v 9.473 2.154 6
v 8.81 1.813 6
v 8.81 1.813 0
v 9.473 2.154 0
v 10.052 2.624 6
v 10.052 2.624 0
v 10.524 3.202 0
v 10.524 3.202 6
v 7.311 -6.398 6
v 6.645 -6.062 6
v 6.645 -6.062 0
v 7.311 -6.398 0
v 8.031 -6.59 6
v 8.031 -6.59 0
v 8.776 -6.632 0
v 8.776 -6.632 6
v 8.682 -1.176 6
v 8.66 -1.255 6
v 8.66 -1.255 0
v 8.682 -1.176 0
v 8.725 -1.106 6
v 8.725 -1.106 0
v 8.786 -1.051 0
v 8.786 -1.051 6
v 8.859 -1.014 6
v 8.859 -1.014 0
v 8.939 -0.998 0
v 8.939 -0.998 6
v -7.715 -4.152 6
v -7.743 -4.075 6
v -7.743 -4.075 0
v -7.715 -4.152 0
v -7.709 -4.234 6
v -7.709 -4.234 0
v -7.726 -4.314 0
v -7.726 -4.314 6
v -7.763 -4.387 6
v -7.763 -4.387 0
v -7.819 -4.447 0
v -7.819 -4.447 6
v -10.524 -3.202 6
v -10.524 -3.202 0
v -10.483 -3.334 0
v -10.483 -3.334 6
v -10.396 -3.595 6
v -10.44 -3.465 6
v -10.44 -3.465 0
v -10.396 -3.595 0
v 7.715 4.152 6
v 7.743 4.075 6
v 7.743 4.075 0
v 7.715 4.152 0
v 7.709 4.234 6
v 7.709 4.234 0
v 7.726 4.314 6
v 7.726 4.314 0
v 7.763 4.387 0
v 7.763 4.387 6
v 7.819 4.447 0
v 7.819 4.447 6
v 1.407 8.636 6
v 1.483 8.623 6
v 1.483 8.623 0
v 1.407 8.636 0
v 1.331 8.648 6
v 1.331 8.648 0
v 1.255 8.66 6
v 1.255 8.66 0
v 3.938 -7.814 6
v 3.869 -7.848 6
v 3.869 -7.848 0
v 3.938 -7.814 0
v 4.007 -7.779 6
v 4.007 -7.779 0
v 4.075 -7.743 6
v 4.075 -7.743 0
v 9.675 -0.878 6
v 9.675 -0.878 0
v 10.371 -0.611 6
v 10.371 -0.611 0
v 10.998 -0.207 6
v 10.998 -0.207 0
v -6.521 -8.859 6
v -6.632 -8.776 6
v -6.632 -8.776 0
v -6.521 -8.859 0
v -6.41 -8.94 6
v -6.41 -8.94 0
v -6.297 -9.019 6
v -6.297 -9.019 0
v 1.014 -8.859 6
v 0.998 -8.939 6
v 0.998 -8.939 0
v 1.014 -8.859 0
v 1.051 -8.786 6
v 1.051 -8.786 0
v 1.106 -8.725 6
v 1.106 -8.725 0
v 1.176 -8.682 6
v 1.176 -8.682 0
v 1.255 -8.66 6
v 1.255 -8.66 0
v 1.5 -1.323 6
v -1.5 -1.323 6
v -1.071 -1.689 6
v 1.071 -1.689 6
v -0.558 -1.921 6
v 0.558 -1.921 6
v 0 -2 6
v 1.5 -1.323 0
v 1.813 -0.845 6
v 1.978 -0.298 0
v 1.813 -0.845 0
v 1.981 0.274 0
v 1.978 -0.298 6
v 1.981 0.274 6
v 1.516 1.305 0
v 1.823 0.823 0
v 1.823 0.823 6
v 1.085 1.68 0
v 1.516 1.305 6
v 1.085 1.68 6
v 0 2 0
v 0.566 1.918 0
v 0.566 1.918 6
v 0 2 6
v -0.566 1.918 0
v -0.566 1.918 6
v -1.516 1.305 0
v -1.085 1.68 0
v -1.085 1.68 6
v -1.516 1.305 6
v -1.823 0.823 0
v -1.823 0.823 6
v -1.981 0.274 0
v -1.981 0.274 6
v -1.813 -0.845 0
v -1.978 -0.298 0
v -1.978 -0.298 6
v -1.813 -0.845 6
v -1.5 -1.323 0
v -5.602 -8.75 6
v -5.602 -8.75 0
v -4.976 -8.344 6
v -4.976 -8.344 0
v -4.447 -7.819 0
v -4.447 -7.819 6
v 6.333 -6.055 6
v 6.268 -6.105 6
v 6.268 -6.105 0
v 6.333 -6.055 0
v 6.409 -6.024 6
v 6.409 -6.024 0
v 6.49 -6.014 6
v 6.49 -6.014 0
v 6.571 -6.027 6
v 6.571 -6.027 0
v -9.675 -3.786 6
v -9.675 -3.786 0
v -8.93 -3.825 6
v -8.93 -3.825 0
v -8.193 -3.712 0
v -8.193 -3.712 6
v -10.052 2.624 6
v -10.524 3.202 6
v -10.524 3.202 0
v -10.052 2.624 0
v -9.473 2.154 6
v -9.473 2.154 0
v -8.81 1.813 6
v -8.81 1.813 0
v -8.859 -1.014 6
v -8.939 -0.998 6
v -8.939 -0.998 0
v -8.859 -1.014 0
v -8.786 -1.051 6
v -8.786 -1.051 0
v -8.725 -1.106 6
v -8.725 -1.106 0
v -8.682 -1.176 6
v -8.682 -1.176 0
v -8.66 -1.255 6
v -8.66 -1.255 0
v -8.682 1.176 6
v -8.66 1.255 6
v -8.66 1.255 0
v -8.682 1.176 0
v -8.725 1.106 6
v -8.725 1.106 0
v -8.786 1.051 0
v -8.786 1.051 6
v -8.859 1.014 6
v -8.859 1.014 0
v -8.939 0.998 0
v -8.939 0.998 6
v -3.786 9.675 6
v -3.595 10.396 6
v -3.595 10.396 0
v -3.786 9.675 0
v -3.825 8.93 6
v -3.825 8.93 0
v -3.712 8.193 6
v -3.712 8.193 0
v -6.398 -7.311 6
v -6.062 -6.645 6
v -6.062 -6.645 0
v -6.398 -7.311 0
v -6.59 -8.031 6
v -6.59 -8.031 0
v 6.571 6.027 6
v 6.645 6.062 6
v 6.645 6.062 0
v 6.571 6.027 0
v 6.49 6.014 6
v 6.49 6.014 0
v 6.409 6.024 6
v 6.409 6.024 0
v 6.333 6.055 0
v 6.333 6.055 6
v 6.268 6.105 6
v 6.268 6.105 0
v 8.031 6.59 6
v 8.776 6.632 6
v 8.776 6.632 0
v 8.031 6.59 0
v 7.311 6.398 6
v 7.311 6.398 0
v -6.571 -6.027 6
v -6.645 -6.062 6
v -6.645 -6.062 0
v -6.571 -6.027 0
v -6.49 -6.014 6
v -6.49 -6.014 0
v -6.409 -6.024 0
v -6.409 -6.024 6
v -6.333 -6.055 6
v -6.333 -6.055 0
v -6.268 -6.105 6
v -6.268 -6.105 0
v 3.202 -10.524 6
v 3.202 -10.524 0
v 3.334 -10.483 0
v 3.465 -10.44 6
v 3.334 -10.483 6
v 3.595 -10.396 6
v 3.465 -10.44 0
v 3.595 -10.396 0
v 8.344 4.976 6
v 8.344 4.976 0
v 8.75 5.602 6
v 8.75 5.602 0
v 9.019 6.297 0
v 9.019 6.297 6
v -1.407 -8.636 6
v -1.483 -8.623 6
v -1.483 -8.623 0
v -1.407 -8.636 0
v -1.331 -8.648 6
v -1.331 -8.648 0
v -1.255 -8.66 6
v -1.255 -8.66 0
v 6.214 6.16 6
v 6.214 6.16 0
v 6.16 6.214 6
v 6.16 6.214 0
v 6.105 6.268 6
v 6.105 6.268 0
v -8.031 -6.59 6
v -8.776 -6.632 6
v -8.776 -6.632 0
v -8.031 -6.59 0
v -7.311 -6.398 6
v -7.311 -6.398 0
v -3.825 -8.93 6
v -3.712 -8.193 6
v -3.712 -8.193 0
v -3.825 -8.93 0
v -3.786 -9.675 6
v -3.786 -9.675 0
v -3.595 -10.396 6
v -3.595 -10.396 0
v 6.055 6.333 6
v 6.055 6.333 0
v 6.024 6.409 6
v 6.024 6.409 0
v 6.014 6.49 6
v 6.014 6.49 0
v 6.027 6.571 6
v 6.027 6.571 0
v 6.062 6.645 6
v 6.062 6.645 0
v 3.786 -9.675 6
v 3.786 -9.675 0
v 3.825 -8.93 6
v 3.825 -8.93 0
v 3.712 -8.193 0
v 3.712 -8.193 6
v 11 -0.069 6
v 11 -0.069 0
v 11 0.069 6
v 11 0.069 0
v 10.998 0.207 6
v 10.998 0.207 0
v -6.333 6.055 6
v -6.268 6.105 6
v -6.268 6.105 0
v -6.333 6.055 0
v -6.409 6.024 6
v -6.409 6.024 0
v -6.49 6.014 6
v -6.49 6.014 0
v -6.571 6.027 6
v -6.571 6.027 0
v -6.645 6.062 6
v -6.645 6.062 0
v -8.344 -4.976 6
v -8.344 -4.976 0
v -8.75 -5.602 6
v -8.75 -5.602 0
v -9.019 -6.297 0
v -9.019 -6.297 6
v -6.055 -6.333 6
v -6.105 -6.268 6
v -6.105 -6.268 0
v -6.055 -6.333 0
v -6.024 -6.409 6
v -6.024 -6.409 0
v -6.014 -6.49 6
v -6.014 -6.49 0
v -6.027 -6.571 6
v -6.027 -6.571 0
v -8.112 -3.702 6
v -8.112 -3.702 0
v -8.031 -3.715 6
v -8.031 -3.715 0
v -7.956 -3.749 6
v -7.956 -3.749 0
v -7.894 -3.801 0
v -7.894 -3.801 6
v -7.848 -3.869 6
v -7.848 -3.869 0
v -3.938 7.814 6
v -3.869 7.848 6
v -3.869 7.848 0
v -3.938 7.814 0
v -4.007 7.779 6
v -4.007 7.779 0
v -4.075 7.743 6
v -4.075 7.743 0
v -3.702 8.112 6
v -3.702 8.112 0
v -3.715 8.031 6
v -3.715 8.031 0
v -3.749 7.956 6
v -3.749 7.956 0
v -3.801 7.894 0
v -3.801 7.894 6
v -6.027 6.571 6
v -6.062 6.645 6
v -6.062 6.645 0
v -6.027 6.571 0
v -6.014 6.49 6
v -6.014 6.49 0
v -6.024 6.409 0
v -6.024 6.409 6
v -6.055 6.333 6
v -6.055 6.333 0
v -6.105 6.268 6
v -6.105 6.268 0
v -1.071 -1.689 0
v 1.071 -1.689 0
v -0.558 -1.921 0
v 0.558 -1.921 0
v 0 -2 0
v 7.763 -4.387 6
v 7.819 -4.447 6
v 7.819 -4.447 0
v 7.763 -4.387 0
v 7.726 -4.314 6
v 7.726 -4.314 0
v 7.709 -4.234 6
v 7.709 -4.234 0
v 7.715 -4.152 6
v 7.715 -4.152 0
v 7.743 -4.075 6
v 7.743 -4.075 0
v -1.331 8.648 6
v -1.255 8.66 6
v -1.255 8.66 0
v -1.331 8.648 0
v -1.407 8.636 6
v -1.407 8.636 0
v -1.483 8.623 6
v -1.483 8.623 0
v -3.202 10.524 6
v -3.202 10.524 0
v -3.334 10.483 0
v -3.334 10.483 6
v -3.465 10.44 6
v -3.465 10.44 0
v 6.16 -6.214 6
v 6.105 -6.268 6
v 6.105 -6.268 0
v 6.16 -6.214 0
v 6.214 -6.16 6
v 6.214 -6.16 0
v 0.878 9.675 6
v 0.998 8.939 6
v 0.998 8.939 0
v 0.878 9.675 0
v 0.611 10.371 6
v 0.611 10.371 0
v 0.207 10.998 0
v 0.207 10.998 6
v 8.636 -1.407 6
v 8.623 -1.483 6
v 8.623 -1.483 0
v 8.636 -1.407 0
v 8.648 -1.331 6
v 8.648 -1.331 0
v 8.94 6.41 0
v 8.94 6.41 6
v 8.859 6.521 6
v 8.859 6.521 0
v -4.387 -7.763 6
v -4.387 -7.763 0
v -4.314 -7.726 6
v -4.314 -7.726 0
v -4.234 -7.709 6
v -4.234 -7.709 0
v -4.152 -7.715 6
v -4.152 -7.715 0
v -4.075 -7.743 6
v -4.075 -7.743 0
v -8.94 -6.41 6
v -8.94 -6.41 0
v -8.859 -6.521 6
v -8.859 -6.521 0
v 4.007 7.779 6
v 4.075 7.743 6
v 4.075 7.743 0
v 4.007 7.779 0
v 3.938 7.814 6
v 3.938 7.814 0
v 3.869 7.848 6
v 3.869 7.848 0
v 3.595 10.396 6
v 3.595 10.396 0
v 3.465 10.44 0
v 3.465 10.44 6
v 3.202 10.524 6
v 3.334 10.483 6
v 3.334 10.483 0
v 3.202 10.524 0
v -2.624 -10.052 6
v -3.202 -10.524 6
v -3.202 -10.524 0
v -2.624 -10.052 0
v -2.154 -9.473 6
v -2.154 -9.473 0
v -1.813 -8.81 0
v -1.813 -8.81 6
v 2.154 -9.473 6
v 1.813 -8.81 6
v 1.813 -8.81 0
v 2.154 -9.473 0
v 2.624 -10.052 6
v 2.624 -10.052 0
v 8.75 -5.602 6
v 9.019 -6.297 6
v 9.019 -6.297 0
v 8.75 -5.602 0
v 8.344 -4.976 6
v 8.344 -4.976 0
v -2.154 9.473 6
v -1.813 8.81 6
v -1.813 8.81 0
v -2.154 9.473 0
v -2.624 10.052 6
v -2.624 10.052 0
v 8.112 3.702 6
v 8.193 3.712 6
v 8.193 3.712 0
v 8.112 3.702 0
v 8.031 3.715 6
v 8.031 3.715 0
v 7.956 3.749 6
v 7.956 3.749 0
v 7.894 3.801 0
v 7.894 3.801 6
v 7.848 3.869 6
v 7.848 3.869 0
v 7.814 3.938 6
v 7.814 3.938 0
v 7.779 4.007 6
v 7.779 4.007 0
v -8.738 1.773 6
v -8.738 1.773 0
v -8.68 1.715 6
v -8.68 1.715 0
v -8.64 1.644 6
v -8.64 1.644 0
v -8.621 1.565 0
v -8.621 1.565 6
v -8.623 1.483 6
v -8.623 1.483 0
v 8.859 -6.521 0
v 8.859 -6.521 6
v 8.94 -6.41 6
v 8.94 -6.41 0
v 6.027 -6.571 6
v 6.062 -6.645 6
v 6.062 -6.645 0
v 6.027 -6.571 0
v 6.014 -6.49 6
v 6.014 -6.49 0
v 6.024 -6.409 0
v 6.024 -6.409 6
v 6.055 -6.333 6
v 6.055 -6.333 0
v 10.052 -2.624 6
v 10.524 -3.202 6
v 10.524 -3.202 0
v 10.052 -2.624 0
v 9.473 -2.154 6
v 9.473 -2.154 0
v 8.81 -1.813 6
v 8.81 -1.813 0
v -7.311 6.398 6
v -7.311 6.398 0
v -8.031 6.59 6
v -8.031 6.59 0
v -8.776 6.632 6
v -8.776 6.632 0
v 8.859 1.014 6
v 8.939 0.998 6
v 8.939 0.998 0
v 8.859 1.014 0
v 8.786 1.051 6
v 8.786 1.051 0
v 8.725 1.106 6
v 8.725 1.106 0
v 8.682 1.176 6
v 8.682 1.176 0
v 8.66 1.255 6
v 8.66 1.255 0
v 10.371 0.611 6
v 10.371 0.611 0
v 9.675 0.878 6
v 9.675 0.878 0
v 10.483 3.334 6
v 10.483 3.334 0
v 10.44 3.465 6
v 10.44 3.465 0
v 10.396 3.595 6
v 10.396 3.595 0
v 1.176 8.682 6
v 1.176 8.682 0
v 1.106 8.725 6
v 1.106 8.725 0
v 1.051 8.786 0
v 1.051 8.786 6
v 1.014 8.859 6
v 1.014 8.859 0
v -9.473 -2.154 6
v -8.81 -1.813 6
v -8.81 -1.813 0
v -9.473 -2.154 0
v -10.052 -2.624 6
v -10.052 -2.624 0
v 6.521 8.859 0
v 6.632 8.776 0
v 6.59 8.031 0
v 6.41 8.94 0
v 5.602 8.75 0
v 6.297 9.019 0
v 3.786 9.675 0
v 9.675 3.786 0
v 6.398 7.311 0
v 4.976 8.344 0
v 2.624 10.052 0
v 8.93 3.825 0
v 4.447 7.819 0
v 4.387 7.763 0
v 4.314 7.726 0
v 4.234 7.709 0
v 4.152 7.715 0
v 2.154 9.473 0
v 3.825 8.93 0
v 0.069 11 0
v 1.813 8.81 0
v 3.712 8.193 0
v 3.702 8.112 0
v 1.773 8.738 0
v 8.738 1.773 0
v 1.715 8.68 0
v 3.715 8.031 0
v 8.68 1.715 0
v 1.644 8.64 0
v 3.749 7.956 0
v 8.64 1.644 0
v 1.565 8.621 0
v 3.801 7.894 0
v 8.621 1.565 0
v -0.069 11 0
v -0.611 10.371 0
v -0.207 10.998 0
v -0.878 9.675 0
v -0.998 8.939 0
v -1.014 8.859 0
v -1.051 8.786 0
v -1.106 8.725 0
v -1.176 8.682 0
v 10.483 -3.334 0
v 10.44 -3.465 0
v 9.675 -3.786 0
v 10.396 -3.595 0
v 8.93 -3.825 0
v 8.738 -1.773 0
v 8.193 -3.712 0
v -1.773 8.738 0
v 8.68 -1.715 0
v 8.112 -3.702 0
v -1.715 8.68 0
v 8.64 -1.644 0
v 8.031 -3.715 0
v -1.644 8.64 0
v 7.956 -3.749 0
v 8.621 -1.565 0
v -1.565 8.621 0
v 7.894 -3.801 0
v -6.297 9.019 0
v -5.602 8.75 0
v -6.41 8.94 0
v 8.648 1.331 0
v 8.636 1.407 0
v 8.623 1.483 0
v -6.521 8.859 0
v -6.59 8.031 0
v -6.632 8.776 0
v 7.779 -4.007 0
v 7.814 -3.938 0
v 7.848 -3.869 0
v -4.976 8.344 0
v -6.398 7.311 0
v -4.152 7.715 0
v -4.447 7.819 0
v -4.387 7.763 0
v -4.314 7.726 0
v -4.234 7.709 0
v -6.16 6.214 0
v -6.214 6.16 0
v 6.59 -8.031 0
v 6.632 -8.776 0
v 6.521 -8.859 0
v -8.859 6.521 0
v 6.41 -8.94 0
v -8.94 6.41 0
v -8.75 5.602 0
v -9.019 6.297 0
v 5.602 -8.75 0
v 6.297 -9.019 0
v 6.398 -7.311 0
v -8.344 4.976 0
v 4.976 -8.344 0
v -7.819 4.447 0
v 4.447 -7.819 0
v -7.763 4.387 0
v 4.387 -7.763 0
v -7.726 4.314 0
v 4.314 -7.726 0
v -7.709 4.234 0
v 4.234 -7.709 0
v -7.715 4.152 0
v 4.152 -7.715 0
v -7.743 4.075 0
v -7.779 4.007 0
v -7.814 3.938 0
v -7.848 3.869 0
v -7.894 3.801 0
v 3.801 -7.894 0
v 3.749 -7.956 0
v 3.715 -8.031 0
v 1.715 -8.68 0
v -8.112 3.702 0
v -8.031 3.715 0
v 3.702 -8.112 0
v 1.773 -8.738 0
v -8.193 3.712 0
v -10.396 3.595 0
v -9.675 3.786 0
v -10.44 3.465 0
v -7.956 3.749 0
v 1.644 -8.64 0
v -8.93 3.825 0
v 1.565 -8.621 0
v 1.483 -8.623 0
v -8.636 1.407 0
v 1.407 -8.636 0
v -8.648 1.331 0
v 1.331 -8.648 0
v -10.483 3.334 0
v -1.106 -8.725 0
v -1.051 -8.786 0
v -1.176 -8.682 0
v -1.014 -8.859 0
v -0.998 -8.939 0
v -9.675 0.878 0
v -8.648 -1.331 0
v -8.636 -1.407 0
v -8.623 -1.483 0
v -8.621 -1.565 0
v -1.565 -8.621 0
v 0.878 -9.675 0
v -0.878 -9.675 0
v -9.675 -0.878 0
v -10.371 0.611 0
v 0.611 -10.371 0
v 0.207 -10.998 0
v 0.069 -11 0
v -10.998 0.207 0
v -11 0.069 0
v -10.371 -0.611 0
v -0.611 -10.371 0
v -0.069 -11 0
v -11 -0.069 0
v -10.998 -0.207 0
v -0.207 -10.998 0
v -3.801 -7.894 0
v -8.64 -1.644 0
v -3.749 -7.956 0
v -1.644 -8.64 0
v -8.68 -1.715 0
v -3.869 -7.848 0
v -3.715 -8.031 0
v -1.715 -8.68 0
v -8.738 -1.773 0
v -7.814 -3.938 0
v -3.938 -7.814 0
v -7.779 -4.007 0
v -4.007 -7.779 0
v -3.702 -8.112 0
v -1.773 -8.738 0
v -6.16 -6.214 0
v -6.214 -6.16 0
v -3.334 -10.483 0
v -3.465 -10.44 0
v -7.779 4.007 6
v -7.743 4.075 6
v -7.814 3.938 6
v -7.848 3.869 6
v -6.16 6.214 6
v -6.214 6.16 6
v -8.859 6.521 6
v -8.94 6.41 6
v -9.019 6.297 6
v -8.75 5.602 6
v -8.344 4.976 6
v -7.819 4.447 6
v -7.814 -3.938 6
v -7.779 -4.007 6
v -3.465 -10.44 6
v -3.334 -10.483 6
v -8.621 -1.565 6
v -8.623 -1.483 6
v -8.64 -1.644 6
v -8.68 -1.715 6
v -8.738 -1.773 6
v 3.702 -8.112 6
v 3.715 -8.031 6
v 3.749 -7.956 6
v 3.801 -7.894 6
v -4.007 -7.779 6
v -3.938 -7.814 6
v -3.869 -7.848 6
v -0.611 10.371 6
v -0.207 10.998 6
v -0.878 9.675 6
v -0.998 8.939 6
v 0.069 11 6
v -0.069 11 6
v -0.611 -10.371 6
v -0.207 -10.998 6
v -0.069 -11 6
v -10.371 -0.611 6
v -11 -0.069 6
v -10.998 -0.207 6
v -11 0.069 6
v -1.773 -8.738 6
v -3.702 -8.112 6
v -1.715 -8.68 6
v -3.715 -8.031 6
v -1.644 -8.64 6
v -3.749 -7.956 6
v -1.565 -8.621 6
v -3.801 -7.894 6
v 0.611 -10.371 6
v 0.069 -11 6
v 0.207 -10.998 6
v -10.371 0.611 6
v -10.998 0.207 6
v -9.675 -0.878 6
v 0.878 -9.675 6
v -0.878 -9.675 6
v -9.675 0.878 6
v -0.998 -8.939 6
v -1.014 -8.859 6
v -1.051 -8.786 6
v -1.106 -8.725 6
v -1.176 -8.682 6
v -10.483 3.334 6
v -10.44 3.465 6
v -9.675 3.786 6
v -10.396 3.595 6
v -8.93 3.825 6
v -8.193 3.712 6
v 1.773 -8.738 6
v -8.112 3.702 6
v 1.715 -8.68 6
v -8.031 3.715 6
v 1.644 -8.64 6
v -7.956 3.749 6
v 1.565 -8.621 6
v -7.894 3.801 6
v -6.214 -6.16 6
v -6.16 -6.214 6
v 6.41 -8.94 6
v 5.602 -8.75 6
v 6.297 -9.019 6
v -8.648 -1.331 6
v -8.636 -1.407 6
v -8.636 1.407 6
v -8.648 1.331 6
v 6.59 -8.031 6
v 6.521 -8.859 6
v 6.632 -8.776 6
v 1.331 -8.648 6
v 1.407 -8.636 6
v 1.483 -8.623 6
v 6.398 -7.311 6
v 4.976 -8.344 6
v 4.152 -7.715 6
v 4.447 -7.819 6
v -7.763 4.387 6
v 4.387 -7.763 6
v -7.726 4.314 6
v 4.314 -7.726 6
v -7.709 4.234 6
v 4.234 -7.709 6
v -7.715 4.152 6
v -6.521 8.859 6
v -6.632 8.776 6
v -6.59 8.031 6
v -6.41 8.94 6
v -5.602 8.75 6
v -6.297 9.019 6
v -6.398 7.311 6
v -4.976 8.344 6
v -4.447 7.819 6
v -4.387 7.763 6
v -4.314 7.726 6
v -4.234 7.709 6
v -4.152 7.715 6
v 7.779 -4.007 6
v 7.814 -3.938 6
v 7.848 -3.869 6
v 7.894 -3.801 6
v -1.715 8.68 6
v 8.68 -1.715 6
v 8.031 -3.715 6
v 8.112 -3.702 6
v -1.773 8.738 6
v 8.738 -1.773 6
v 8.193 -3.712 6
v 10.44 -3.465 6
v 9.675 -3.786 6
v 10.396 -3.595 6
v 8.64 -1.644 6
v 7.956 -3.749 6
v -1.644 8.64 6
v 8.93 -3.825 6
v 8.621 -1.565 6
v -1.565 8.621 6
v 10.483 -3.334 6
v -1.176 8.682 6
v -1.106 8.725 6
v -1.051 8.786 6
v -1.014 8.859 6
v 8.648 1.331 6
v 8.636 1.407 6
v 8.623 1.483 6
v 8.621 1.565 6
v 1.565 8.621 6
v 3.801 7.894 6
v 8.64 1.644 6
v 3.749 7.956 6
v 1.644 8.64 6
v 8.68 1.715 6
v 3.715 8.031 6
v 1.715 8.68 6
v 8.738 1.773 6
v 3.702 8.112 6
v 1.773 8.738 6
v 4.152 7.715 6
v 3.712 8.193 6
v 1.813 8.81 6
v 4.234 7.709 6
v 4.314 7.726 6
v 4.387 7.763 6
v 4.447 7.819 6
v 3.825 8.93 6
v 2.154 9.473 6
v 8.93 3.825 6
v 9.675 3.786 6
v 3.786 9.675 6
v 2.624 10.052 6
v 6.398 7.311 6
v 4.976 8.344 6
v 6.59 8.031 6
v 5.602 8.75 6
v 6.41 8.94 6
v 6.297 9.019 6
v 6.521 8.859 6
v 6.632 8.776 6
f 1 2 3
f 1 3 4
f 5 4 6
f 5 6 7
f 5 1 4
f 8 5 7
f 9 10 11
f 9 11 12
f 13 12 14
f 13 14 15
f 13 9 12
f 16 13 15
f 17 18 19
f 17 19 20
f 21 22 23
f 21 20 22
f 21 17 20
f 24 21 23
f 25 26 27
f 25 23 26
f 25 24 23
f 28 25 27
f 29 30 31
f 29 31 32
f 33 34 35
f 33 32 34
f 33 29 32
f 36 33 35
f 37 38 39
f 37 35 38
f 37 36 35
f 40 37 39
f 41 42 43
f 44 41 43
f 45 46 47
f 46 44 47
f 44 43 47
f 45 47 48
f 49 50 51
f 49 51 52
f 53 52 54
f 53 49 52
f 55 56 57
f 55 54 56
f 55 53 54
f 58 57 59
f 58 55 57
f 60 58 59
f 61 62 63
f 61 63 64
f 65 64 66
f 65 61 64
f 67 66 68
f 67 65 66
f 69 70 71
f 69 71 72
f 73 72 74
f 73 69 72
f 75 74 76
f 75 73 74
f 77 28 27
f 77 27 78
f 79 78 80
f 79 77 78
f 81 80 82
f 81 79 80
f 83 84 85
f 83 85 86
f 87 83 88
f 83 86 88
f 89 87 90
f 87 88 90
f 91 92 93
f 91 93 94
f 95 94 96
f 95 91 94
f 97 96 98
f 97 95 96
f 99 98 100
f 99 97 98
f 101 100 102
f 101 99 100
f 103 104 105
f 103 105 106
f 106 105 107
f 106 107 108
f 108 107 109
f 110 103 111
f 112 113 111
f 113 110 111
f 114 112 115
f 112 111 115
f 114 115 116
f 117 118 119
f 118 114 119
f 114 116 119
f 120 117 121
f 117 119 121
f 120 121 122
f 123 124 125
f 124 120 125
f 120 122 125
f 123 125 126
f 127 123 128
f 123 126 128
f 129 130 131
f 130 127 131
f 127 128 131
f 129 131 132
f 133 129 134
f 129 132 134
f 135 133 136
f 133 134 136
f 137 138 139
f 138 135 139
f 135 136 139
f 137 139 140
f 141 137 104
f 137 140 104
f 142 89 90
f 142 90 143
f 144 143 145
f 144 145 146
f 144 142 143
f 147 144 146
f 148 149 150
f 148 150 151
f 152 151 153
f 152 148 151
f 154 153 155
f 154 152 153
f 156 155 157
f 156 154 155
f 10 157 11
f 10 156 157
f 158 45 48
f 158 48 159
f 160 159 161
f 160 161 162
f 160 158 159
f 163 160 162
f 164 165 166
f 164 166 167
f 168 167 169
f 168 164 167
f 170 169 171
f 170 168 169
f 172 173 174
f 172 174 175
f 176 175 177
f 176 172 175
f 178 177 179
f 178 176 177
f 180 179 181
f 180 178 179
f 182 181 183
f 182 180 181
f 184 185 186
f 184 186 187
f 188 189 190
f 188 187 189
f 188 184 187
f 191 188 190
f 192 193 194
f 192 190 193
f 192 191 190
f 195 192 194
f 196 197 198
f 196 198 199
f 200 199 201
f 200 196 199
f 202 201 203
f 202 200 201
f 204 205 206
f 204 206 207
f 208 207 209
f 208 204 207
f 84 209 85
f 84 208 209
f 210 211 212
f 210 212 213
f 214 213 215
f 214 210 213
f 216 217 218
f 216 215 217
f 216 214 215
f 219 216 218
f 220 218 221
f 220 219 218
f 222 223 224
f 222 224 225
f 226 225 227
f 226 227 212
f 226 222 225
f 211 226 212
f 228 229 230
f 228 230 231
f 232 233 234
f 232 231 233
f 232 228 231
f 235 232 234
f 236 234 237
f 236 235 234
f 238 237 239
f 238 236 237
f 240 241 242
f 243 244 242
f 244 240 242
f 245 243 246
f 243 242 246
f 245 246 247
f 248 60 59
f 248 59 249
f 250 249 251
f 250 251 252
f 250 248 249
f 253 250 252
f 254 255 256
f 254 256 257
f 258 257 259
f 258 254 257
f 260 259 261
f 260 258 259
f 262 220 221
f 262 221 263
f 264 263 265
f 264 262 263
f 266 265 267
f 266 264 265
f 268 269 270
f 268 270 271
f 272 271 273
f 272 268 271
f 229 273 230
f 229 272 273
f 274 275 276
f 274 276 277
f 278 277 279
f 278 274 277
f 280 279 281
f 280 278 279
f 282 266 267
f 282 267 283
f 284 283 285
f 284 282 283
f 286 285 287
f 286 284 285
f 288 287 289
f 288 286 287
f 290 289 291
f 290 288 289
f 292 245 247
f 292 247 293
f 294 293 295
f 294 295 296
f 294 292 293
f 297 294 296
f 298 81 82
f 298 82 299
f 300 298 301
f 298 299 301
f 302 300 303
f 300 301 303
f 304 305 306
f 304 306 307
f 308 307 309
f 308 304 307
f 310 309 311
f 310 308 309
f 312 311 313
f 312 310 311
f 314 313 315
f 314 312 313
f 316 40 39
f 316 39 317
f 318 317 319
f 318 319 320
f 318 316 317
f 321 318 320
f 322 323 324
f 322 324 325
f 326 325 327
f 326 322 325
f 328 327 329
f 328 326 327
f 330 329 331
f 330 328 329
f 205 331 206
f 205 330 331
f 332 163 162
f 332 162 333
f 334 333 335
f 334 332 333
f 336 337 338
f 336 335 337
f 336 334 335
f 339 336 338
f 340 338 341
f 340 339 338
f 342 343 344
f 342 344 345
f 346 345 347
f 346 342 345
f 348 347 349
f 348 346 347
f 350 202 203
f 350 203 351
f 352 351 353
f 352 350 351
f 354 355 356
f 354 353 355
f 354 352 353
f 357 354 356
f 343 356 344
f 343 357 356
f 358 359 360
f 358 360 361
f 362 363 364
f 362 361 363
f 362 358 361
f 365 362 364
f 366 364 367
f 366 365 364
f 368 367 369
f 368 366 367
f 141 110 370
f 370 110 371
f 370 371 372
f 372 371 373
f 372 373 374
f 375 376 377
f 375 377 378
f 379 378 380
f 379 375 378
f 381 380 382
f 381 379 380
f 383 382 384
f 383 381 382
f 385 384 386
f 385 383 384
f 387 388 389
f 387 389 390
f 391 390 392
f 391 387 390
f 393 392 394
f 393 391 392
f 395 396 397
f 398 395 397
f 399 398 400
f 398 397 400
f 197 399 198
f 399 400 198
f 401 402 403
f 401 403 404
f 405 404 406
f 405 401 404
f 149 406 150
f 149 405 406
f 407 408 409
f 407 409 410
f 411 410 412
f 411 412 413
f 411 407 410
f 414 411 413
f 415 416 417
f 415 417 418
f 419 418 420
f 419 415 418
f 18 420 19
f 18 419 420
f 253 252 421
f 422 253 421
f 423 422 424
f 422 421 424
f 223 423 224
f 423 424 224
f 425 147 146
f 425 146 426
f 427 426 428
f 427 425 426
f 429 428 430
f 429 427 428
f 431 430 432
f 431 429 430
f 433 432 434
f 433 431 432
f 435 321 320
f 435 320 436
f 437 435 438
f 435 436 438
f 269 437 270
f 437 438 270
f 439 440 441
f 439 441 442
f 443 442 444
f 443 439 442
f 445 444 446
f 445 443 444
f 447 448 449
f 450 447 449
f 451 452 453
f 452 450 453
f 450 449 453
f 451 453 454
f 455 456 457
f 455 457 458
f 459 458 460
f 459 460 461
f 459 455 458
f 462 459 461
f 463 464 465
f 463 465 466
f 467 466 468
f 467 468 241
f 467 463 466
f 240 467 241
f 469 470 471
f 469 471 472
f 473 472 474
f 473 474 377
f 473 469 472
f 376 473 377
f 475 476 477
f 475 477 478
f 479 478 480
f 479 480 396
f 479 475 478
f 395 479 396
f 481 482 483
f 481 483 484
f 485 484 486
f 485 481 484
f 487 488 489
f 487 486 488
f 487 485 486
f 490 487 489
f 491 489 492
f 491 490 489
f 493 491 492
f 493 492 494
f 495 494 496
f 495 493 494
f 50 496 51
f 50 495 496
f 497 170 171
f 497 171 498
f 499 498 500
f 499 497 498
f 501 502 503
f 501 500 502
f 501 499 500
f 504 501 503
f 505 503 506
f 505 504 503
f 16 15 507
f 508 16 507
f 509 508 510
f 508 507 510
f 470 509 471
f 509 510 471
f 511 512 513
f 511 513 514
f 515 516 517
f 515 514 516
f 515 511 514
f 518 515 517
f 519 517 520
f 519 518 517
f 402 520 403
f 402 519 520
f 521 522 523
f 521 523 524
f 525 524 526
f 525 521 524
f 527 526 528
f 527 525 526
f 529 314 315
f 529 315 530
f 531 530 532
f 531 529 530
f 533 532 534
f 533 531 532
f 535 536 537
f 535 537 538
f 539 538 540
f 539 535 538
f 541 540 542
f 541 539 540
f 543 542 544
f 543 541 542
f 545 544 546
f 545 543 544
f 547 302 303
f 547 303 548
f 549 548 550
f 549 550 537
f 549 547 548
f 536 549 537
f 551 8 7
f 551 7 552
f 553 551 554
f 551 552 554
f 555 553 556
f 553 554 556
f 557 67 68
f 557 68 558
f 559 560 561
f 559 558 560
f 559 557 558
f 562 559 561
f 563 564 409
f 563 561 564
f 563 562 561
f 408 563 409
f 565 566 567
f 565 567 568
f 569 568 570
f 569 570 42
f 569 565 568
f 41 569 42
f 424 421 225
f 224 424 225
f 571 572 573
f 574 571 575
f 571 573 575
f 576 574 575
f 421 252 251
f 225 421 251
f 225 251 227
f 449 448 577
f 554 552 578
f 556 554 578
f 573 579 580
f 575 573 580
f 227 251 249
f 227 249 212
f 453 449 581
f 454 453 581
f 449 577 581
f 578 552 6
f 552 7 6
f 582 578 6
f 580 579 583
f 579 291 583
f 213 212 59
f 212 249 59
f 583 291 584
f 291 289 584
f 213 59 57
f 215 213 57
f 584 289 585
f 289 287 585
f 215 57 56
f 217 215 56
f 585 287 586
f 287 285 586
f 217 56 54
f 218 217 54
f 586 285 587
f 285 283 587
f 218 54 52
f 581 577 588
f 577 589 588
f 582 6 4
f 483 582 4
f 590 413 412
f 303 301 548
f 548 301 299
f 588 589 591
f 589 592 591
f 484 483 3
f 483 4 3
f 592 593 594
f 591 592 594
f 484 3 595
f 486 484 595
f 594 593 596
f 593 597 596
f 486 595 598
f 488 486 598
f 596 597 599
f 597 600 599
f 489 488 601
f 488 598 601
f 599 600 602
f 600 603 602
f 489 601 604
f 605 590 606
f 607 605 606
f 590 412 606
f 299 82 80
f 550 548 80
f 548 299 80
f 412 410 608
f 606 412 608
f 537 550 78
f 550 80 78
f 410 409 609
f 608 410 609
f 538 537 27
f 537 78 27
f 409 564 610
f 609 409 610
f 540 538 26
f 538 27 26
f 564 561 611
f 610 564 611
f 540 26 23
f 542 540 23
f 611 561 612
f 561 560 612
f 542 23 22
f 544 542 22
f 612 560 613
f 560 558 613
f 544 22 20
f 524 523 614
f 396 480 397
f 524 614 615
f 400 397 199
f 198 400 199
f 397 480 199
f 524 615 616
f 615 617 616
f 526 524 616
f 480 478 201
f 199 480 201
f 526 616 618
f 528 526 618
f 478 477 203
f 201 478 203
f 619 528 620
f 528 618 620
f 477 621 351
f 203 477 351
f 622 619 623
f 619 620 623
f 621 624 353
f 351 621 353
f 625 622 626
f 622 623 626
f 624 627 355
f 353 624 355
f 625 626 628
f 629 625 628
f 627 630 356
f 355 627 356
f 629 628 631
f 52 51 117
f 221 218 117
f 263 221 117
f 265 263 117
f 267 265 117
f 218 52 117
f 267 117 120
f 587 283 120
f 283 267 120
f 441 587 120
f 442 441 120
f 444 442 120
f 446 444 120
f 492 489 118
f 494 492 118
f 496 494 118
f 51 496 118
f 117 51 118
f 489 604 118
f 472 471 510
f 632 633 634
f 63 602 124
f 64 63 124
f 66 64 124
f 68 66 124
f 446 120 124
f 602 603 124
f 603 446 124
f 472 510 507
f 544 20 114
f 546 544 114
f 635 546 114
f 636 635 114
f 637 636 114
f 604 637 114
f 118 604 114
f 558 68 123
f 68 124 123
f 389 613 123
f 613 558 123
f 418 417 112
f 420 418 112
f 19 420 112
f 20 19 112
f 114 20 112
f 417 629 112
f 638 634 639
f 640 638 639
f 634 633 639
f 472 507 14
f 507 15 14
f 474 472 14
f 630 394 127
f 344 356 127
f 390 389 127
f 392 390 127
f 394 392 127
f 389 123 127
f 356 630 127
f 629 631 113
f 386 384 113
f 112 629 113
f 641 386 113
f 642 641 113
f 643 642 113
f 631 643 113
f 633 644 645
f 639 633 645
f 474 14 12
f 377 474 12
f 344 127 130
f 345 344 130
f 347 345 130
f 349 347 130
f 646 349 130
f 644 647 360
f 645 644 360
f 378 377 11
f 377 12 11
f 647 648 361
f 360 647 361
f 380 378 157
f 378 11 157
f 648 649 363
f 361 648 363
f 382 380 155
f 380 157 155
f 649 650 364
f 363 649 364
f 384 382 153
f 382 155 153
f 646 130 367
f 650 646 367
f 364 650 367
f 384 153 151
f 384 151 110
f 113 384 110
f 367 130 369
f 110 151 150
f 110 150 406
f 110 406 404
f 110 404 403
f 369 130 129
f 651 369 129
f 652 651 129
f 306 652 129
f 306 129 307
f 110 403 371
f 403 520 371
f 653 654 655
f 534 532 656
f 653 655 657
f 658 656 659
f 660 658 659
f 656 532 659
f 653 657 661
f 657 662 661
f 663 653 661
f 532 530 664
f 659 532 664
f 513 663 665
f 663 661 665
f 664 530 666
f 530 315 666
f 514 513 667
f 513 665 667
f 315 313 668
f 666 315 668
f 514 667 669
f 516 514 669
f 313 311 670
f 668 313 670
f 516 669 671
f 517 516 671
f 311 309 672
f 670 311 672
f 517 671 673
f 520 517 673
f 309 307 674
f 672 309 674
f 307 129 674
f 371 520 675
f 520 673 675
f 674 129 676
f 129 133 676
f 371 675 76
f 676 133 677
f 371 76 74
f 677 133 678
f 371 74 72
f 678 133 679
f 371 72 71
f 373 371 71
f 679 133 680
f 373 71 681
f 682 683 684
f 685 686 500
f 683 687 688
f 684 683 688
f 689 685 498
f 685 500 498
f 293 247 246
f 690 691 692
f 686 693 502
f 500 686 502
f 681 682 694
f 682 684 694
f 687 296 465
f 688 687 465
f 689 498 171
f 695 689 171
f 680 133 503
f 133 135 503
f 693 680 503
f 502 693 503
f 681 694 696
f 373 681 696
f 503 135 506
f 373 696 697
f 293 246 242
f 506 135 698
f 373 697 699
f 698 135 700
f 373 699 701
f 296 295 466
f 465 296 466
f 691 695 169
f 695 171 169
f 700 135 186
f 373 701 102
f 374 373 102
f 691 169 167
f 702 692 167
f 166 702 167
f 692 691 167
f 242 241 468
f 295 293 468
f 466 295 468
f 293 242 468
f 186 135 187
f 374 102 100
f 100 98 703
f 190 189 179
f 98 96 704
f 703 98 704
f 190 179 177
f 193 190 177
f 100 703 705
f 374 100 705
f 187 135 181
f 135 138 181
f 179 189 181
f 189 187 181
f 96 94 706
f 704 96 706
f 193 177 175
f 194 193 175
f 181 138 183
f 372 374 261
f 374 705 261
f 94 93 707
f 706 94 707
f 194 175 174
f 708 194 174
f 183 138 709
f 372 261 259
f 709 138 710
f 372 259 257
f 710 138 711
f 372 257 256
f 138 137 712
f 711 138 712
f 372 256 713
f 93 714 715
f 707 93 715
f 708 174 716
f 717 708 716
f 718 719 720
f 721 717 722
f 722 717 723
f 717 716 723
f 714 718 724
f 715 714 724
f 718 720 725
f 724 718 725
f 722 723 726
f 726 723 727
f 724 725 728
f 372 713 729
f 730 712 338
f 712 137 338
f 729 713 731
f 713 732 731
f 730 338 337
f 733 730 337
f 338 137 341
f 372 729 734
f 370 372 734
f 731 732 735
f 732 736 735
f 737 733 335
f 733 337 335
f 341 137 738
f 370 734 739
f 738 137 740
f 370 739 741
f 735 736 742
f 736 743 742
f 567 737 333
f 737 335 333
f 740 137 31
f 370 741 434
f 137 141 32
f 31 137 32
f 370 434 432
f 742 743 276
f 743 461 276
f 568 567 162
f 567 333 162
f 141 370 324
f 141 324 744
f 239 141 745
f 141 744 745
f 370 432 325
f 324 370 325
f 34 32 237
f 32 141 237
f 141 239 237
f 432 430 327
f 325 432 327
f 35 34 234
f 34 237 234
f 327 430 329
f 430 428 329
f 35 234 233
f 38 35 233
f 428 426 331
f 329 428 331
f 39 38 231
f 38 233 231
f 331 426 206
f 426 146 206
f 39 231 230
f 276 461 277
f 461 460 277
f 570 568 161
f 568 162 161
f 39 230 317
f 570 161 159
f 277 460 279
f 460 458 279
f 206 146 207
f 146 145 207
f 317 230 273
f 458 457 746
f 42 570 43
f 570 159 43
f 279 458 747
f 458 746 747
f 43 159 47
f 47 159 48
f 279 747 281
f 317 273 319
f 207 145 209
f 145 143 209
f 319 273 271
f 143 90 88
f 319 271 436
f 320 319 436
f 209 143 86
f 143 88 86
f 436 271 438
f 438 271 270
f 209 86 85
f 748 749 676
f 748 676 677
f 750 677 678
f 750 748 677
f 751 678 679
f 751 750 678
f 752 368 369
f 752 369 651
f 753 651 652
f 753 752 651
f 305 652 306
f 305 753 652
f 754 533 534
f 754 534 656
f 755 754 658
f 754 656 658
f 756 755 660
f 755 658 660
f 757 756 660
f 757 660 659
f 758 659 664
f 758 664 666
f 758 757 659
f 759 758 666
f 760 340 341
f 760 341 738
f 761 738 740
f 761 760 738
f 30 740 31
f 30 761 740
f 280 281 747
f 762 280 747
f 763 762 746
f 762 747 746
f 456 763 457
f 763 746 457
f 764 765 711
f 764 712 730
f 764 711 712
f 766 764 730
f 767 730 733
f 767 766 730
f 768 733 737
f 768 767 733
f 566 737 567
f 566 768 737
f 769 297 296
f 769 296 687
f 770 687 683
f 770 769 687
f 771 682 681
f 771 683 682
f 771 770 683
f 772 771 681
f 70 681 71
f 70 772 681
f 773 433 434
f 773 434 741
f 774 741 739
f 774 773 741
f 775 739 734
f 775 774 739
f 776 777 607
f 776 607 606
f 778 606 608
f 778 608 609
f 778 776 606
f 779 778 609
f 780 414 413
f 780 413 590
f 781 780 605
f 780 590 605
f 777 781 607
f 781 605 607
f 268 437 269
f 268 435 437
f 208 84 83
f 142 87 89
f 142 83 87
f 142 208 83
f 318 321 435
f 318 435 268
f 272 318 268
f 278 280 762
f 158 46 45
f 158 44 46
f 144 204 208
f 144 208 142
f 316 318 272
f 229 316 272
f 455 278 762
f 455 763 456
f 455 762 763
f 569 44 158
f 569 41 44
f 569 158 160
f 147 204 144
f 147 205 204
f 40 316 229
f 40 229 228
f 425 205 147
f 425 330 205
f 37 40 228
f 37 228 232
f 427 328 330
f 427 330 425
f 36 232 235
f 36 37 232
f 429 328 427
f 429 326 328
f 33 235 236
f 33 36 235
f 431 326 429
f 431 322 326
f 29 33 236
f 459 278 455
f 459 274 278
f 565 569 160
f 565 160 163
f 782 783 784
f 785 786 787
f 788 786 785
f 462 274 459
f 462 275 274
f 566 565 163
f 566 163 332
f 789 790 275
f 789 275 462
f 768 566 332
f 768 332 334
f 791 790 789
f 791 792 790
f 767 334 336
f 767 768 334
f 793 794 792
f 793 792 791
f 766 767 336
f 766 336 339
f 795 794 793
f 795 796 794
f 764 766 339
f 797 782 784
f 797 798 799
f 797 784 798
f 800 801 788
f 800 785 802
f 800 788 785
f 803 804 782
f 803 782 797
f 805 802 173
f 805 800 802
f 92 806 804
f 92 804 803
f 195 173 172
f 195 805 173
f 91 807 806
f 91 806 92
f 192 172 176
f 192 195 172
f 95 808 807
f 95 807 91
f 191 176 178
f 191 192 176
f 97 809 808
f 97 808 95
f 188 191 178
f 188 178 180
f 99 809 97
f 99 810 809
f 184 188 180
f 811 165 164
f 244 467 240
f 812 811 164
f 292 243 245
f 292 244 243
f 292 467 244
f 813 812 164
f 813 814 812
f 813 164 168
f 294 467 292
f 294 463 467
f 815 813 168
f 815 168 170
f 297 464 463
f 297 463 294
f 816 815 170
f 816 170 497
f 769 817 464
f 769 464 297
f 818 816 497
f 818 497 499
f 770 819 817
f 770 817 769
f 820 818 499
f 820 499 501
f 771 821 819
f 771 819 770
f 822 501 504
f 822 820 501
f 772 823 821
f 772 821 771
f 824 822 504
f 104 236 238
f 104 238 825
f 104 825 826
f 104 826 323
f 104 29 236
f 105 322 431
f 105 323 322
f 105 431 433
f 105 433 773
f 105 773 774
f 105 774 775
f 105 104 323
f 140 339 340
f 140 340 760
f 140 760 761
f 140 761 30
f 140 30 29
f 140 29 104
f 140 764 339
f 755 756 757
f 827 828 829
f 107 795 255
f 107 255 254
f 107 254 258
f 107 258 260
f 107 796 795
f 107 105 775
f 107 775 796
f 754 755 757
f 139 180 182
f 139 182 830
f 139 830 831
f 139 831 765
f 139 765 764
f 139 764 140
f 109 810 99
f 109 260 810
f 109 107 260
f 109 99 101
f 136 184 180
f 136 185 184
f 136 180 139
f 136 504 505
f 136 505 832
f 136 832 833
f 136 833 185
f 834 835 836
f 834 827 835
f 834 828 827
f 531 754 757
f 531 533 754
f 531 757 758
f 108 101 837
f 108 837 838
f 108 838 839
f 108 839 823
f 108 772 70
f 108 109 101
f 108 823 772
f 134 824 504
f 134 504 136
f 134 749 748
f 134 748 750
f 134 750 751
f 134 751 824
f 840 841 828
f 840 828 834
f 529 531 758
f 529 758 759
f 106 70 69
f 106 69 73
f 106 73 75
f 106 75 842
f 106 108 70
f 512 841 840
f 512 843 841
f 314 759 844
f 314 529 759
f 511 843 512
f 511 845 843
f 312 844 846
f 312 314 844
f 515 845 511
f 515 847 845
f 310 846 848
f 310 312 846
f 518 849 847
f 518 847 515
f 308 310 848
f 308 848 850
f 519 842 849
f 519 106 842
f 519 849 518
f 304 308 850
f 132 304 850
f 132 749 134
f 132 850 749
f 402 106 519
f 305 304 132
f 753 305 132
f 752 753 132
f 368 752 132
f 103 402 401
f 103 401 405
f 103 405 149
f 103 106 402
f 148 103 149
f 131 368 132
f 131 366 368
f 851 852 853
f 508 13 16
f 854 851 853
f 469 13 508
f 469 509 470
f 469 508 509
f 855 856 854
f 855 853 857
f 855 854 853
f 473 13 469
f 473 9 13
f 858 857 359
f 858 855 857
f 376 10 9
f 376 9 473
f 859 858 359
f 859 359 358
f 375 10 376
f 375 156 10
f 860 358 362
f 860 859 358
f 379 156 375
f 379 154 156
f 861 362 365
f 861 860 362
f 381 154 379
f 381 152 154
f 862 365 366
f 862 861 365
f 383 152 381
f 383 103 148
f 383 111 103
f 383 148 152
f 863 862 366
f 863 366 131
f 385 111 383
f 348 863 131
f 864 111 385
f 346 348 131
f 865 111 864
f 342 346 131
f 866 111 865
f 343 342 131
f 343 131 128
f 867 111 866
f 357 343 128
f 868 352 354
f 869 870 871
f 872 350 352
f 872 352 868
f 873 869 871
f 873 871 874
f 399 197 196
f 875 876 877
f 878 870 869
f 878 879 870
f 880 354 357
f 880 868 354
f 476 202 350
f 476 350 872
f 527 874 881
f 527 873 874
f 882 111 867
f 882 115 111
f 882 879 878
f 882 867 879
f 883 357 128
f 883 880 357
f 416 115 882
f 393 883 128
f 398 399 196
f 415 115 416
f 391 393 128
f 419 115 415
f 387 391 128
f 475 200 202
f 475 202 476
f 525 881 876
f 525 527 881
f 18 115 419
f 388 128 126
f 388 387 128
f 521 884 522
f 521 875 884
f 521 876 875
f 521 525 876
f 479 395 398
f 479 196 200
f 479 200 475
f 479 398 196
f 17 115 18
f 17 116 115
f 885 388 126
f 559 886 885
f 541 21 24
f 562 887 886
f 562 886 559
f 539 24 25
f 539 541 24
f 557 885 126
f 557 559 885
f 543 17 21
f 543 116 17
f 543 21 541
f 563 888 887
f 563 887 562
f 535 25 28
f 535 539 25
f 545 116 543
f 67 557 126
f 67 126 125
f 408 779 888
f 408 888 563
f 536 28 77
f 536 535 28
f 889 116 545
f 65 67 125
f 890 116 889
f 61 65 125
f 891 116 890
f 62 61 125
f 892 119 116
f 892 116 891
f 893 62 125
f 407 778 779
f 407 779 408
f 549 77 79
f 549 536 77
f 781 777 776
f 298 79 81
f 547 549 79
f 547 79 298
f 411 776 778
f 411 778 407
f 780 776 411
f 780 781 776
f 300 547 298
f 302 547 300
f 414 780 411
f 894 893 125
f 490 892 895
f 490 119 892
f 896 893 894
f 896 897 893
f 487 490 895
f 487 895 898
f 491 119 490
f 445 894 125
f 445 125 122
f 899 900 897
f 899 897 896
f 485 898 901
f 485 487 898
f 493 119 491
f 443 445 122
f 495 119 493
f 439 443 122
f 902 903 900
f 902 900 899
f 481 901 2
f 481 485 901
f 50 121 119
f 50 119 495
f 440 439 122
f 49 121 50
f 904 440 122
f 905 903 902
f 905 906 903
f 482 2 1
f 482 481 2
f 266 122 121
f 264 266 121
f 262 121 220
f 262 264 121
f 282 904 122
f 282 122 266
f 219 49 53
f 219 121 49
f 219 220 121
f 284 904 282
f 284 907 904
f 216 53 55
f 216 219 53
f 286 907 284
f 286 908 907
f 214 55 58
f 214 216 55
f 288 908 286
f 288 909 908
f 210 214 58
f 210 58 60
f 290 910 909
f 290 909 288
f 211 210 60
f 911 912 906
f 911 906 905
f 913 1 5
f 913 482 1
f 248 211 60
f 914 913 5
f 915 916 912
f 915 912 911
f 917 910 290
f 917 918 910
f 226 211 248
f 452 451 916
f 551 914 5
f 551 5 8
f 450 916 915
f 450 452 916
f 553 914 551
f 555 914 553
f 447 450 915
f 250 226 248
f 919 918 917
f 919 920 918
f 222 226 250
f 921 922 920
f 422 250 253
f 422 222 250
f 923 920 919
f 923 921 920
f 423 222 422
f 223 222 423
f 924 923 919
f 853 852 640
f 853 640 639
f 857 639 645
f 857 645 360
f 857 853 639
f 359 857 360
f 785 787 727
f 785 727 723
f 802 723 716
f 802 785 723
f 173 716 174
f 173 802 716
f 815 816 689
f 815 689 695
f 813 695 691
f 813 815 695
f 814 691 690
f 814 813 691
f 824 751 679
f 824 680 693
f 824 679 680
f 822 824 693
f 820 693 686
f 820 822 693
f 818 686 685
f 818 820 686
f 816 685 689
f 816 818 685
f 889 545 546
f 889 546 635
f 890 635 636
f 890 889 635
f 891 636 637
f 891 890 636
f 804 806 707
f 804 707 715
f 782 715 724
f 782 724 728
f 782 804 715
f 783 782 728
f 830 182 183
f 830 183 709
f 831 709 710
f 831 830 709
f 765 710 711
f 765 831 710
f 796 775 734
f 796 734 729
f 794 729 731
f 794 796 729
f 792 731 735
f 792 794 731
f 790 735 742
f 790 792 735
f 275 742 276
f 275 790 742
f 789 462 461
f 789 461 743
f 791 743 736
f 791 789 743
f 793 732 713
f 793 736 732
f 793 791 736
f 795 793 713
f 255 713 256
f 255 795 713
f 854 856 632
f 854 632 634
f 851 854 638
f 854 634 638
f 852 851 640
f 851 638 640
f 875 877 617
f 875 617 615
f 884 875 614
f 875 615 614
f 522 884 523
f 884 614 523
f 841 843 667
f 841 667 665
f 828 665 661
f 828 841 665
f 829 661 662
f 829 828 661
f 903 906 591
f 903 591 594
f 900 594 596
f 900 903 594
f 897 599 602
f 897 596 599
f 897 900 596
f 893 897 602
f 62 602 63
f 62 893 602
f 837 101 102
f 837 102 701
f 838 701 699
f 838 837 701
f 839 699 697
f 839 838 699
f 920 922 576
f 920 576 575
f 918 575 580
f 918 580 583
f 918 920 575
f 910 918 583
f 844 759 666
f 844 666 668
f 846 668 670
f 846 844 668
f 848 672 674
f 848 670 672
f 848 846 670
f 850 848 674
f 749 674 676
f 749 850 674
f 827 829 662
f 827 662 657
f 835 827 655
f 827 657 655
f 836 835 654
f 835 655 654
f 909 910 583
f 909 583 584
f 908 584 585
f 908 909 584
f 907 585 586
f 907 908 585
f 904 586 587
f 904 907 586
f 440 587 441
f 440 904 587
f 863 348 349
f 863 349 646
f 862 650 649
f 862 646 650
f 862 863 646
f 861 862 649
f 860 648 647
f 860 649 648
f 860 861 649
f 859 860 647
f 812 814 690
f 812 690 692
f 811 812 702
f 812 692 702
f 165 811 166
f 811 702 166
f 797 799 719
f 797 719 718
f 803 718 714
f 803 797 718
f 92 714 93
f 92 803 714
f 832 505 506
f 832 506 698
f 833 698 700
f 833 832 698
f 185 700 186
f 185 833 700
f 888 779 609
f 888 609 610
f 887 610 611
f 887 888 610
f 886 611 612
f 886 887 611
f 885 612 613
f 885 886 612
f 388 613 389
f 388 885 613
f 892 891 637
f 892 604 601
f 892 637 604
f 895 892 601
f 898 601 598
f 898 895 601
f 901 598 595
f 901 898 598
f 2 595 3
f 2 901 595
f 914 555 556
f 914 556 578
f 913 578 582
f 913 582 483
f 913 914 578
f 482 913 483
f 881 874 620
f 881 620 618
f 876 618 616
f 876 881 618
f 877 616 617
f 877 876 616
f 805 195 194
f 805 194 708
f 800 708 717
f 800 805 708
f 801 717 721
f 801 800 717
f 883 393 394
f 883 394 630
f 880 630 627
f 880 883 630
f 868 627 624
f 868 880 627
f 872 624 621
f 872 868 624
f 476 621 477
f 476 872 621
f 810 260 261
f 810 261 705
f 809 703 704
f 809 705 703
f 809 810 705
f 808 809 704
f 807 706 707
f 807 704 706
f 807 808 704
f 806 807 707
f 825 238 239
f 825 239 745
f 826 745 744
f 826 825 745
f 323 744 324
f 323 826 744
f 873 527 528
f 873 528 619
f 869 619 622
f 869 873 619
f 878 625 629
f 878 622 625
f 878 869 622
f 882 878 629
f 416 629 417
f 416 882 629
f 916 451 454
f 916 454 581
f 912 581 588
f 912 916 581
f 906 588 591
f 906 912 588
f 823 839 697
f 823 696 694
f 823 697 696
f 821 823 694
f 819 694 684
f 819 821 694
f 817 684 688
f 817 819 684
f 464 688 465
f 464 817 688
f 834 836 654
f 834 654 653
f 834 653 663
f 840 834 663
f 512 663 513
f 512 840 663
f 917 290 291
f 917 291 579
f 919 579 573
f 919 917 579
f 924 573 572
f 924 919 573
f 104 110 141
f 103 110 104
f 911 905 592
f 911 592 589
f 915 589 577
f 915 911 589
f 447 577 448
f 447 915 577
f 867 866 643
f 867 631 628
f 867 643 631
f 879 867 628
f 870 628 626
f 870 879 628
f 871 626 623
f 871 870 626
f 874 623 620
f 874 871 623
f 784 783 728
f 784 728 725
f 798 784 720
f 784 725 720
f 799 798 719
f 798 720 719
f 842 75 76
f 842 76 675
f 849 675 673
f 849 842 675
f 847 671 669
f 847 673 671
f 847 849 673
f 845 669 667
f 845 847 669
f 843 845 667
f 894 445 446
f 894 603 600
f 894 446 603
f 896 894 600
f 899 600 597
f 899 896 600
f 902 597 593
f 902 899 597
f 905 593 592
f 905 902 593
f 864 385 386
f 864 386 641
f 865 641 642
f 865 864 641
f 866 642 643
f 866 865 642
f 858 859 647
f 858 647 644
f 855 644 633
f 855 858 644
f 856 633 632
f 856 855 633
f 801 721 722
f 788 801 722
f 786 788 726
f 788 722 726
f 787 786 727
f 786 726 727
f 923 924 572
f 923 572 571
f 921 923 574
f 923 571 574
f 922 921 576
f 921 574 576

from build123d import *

# Parameters (mm, degrees)
CUT_EXTRUDE1_DEPTH  = 20.646882704
CIRPATTERN1_COUNT   = 20
SKETCH5_R           = 7.15
SKETCH5_R_2         = 2
BOSS_EXTRUDE1_DEPTH = 6
CUT_EXTRUDE2_REACH  = 18.673
SKETCH6_R           = 5.85
BOSS_EXTRUDE2_DEPTH = 3


with BuildPart() as part:
    # Sketch3 → Revolve1 (revolve)
    with BuildSketch(Plane(origin=(0, 0, 0), x_dir=(0, 0, -1), z_dir=(1, 0, 0)), mode=Mode.PRIVATE) as revolve1_sk:
        Polygon((-6, 11), (0, 11), (0, 7.15), (-1.714285714, 7.15), (-1.714285714, 5.85), (6, 5.85), (6, 2.5), (-6, 2.5), (-6, 5.85), (-4.285714286, 5.85), (-4.285714286, 7.15), (-6, 7.15), align=None)
    revolve(revolve1_sk.sketch.rotate(Axis((0, 0, -6), (0, 0, 1)), 90), axis=Axis((0, 0, -6), (0, 0, 1)))

    # Sketch4 → Cut-Extrude1 (cut, symmetric)
    with BuildSketch(Plane.XY.offset(6)):
        with BuildLine():
            ThreePointArc((-0.206650348, 10.998058721), (-0.762582532, 10.030093075), (-0.998187985, 8.938988976))
            ThreePointArc((-0.998187985, 8.938988976), (-1.076668536, 8.753613059), (-1.254660723, 8.65958004))
            ThreePointArc((-1.254660723, 8.65958004), (-1.368801569, 8.64227298), (-1.48270414, 8.623461511))
            ThreePointArc((-1.48270414, 8.623461511), (-1.681042571, 8.657889616), (-1.812966318, 8.809940765))
            ThreePointArc((-1.812966318, 8.809940765), (-2.374210129, 9.77483634), (-3.20205089, 10.523633883))
            ThreePointArc((-3.20205089, 10.523633883), (-1.720779115, 10.864571747), (-0.206650348, 10.998058721))
        make_face()
    cut_extrude1 = extrude(amount=CUT_EXTRUDE1_DEPTH, both=True, mode=Mode.SUBTRACT)

    # CirPattern1: Cut-Extrude1 ×20 about axis
    cirpattern1_axis = Axis((0, 0, 0), (0, 0, 1))
    for i in range(1, CIRPATTERN1_COUNT):
        add(cut_extrude1.rotate(cirpattern1_axis, i * 360 / CIRPATTERN1_COUNT), mode=Mode.SUBTRACT)

    # Sketch5 → Boss-Extrude1 (add)
    with BuildSketch(Plane.XY.offset(6)):
        Circle(SKETCH5_R)
        Circle(SKETCH5_R_2, mode=Mode.SUBTRACT)
    extrude(amount=-BOSS_EXTRUDE1_DEPTH)

    # Sketch6 → Cut-Extrude2 (cut, up to next)
    with BuildSketch(Plane(origin=(0, 0, 0), x_dir=(-1, 0, 0), z_dir=(0, 0, -1)), mode=Mode.PRIVATE) as cut_extrude2_sk1:
        Circle(SKETCH6_R)
    cut_extrude2_tool1 = extrude(cut_extrude2_sk1.sketch, amount=CUT_EXTRUDE2_REACH, mode=Mode.PRIVATE) & part.part
    add(cut_extrude2_tool1.solids().sort_by_distance((0, 0, 0))[0], mode=Mode.SUBTRACT)

    # 3DSketch1 → Boss-Extrude2 (add)
    with BuildSketch(Plane(origin=(-1.5, -1.322875656, 6), x_dir=(0.4472135954999579, 0, -0.894427190999916), z_dir=(0, -1, 0))):
        Polygon((0, 0), (1.341640786, 2.683281573), (6.708203932, 0), (5.366563146, -2.683281573), align=None)
    extrude(amount=BOSS_EXTRUDE2_DEPTH)


solid = part.part
